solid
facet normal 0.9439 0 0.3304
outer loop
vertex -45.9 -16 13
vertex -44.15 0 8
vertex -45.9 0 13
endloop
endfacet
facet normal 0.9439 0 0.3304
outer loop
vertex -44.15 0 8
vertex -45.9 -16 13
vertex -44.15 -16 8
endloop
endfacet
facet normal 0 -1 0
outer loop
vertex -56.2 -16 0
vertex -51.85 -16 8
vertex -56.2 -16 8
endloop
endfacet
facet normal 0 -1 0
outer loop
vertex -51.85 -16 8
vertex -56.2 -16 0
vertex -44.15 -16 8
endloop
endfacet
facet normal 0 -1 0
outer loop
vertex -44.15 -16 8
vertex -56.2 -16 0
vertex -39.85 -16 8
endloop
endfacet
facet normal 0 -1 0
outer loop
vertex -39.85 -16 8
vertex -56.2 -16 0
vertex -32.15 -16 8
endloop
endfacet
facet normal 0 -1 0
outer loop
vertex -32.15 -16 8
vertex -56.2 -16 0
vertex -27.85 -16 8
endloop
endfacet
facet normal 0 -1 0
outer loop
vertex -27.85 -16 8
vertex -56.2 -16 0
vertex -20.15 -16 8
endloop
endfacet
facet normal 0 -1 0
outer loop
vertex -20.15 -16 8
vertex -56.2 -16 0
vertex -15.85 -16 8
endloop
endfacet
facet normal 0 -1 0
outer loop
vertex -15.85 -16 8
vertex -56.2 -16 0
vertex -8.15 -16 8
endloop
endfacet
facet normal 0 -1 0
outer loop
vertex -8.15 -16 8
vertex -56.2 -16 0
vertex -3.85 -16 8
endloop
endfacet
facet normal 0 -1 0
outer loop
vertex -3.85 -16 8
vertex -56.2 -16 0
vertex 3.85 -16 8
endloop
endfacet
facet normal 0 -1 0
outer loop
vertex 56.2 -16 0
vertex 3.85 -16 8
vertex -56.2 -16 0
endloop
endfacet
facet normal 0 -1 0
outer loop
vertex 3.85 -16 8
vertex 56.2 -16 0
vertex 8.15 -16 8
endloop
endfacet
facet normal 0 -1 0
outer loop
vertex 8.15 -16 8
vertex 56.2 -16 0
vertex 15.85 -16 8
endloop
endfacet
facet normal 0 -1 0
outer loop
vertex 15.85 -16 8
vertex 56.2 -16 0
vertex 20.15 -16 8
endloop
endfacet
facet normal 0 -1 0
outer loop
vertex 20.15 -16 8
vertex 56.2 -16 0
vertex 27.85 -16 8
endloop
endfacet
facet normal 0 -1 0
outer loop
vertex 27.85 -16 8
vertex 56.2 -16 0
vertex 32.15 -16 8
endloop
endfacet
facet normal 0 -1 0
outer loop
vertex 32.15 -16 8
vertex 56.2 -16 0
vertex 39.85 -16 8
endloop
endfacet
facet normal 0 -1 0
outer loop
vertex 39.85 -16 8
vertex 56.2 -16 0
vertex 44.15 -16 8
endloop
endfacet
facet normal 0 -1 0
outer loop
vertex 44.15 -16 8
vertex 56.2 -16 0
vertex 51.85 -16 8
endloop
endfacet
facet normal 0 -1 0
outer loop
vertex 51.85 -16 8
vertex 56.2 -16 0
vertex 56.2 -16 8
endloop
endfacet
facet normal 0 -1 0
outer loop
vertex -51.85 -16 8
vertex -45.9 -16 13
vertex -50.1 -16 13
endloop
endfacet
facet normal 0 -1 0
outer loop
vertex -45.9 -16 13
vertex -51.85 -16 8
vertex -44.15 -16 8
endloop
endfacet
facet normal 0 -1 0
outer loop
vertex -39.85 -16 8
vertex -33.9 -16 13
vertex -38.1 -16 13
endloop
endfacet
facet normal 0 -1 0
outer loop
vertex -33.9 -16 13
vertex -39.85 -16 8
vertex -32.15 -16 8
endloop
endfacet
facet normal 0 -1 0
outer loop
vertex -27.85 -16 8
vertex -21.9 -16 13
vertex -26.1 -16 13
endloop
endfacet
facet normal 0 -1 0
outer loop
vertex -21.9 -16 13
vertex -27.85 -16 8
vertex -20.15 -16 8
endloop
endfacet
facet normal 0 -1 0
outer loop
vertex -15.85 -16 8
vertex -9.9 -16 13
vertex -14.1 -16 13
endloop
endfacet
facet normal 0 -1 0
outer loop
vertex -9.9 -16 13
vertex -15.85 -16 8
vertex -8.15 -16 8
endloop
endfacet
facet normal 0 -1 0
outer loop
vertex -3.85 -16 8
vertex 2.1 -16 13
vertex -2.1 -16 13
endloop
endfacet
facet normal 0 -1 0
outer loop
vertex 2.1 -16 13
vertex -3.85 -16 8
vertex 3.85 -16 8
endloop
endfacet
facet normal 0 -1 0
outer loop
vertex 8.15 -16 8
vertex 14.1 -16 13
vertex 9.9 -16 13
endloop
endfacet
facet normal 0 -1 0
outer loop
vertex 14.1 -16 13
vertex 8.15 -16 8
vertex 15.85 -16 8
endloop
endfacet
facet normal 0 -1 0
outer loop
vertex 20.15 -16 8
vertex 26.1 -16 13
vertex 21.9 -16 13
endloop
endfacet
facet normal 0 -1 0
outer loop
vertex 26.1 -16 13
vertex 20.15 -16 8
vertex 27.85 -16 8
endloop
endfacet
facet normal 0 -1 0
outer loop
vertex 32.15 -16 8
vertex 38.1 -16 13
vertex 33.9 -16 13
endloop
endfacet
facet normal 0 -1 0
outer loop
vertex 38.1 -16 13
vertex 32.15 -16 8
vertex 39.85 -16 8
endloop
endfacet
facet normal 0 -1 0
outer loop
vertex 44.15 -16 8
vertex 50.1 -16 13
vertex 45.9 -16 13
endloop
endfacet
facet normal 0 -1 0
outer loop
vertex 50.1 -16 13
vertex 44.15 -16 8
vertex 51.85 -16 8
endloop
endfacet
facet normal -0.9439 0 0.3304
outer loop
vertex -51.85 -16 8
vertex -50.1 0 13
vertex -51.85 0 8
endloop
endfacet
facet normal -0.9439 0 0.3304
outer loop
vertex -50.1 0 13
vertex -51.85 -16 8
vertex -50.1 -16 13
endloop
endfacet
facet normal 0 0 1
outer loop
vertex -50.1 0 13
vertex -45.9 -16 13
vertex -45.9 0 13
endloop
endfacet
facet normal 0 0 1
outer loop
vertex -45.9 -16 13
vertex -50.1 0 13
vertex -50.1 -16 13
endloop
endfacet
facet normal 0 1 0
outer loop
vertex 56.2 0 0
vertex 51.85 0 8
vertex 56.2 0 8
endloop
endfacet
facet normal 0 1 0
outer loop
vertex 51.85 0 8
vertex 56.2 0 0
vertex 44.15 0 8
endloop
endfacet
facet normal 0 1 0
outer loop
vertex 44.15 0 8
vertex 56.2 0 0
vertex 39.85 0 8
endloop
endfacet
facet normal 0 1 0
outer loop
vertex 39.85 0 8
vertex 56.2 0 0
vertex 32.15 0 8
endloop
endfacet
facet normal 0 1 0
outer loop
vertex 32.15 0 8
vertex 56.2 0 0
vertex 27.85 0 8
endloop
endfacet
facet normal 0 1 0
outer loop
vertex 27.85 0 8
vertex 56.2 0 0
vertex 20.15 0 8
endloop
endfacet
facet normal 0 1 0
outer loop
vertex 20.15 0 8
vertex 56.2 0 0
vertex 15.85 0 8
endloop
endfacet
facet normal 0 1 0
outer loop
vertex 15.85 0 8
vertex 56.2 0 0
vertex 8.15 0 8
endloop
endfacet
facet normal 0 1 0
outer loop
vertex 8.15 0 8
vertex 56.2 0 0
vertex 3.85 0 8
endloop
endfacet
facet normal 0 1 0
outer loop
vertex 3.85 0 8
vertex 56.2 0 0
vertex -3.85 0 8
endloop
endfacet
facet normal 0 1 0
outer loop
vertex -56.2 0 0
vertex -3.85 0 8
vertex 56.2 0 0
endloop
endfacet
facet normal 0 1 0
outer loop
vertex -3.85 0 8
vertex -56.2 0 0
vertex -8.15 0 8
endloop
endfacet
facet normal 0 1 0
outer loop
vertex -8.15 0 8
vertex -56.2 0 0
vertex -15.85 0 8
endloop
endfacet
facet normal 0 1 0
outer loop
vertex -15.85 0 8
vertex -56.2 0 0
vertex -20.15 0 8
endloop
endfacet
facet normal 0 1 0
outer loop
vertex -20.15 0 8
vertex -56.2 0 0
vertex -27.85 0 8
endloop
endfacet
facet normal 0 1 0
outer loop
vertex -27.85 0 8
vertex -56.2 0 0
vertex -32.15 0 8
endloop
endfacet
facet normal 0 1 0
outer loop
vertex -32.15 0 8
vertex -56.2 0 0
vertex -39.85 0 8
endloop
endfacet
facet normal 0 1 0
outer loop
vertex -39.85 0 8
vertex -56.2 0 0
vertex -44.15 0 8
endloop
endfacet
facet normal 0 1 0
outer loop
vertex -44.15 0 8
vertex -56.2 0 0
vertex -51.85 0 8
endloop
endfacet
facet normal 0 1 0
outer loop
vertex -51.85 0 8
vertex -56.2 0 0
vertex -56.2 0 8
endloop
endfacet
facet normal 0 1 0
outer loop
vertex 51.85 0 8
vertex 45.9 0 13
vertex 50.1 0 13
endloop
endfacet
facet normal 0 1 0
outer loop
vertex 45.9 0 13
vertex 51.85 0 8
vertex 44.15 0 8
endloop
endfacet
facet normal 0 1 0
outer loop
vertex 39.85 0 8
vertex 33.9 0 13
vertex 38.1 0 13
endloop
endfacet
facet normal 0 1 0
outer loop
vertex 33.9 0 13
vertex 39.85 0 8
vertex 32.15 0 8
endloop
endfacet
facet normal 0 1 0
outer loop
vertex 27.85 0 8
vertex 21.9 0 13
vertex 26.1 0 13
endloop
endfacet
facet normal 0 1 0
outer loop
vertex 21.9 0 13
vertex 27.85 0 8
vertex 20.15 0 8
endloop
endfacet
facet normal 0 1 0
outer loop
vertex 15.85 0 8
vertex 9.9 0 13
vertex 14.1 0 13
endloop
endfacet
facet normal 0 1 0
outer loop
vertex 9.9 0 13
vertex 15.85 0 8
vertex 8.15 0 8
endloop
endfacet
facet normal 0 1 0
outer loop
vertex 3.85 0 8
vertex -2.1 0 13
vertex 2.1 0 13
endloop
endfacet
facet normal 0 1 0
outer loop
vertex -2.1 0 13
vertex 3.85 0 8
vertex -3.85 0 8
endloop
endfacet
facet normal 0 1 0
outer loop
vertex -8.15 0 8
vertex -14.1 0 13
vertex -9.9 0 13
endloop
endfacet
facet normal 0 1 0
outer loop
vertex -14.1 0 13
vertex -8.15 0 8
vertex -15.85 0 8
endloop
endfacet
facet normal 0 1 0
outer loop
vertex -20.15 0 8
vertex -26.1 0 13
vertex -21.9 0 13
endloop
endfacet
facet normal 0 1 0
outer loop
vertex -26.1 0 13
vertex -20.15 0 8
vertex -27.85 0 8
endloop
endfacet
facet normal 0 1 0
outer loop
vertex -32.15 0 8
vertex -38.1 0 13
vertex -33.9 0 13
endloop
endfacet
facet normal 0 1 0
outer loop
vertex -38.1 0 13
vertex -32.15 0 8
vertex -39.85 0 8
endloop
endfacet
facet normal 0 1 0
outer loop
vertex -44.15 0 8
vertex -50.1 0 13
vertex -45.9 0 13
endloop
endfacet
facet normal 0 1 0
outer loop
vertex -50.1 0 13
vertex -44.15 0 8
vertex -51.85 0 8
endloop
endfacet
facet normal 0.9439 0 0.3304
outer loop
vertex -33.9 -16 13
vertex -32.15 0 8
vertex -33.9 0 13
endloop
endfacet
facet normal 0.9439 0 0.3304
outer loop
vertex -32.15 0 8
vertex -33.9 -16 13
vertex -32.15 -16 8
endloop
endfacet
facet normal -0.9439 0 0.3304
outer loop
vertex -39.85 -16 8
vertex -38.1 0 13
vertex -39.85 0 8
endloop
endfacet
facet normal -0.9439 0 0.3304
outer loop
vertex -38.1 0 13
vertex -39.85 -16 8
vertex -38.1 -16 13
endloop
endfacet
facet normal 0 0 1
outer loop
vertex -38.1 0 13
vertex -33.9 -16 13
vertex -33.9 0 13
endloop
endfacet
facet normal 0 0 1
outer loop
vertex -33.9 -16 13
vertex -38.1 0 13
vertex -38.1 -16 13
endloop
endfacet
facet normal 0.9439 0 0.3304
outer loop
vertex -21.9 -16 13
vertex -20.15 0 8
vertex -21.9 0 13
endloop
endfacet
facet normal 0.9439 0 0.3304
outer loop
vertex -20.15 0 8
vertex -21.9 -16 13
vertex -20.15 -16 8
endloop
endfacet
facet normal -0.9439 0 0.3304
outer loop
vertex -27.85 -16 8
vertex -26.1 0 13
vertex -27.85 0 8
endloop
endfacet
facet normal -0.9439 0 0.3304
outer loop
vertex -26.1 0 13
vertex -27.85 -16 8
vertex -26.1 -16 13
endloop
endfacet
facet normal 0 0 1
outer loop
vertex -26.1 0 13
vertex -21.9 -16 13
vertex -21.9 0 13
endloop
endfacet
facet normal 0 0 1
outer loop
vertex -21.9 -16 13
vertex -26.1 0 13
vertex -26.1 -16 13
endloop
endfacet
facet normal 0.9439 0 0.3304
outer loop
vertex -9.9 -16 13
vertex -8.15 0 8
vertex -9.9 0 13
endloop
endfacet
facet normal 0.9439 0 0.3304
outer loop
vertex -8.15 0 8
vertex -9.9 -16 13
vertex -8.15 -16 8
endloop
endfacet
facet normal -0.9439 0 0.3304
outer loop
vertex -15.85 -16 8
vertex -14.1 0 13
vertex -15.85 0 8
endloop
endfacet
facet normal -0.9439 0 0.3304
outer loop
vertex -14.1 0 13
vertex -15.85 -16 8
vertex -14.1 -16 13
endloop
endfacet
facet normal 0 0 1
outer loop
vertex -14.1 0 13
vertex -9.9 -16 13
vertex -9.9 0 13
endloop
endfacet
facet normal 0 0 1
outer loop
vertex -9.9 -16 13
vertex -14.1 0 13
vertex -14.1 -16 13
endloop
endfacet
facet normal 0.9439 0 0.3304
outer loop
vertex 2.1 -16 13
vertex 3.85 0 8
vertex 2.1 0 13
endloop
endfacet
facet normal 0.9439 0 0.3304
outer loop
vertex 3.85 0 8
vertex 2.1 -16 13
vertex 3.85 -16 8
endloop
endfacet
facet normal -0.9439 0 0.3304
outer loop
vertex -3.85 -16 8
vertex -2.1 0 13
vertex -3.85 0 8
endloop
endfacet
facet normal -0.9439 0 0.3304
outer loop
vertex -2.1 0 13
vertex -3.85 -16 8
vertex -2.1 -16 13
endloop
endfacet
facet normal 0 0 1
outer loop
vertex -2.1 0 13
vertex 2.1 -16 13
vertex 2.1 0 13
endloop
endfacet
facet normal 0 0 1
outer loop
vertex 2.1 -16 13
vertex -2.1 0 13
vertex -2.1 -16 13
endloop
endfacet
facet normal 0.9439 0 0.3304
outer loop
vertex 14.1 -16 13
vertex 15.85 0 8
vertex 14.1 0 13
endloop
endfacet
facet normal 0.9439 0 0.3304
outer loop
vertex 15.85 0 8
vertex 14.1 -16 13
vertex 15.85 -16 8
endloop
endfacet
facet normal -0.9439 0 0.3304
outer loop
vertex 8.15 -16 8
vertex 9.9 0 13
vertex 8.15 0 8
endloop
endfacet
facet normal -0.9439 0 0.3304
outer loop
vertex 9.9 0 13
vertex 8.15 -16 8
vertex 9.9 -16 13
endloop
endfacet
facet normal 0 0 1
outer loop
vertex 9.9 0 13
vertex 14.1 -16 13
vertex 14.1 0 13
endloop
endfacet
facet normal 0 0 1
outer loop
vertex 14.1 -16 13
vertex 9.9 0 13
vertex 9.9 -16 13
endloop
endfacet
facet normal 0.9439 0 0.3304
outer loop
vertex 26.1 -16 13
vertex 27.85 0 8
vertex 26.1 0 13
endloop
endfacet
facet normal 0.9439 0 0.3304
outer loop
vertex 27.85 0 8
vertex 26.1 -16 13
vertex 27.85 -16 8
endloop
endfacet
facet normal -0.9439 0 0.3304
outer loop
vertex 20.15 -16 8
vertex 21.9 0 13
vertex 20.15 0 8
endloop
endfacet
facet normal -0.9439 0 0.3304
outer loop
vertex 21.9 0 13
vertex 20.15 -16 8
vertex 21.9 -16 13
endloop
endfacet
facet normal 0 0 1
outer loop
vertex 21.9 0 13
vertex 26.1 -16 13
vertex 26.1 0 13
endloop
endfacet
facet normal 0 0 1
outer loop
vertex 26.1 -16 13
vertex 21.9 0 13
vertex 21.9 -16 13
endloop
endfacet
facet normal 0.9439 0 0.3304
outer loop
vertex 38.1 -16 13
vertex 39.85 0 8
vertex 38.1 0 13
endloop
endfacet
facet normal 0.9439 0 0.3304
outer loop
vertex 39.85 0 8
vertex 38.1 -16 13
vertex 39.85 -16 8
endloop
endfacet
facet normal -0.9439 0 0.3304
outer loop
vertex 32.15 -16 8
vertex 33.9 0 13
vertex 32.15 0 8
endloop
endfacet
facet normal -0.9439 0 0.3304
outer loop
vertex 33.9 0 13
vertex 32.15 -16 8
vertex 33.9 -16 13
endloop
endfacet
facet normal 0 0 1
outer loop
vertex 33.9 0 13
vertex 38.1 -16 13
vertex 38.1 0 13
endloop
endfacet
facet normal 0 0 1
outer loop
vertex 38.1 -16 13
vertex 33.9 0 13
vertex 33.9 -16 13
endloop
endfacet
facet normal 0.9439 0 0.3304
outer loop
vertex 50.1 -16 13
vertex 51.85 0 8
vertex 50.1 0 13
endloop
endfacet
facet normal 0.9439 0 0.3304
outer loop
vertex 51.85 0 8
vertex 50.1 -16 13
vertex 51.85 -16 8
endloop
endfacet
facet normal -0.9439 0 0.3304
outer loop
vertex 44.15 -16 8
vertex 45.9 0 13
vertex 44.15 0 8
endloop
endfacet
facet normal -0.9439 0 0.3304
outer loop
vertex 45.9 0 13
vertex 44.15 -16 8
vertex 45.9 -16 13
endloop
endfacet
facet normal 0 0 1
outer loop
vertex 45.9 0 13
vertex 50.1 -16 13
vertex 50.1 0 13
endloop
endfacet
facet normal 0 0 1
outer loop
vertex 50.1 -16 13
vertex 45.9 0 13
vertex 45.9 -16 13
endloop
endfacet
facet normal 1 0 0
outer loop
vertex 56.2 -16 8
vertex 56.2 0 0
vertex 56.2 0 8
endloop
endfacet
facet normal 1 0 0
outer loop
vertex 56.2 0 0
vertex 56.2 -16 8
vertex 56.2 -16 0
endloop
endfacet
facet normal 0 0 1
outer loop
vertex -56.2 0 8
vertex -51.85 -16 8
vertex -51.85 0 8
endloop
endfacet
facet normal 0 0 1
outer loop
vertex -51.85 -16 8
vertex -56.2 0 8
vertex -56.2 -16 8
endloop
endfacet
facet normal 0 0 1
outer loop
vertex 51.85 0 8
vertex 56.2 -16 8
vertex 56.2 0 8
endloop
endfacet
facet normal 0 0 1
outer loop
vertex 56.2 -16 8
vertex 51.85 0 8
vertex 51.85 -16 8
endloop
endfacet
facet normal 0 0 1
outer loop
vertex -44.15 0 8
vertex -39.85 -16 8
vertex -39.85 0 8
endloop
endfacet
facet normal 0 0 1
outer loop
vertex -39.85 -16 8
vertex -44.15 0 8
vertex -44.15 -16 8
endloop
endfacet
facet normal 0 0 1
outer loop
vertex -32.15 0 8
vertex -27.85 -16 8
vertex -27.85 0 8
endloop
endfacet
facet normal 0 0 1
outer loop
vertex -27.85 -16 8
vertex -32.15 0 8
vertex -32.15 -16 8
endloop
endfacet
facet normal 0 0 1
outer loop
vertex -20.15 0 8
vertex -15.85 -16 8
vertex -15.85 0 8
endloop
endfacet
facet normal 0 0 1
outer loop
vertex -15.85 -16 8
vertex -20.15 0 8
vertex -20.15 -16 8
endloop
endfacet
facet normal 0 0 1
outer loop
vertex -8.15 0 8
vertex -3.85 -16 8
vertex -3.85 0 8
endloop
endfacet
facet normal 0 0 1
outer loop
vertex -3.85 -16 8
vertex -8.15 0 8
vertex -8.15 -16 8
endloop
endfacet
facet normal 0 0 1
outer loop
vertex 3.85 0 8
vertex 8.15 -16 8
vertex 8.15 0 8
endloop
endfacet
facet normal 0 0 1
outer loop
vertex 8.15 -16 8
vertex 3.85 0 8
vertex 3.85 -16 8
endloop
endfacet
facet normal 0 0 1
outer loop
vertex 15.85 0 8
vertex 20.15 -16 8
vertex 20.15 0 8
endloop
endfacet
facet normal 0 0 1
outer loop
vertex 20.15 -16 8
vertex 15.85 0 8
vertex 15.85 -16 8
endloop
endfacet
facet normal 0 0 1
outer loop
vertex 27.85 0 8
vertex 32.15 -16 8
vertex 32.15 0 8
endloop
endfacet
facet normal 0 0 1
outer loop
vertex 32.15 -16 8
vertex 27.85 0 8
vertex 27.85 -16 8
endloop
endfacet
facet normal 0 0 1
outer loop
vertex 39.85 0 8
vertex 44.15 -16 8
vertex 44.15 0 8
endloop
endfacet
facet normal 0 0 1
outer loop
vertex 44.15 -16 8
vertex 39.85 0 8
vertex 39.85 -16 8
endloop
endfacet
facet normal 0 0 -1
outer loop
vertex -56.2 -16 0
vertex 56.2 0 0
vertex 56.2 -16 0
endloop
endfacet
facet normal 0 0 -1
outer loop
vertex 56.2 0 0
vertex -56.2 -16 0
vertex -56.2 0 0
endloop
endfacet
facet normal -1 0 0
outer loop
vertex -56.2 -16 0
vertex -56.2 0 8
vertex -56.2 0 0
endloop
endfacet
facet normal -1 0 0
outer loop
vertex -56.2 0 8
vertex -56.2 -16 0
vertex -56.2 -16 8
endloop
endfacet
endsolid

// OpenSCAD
$fn = 32;

// ----------------------------------------------------------------------
// Toothed rack, 9 teeth
// 12 mm pitch, 5 mm teeth
// ----------------------------------------------------------------------

// --- parameters (mm) ---
bar_w = 16;     // bar width (Y)
bar_h = 8;      // bar height (Z)
teeth = 9;      // number of teeth
pitch = 12;     // tooth pitch
tooth_h = 5;    // tooth height above the bar
root_w = 8.4;   // tooth width at the root
crest_w = 4.2;  // tooth width at the crest

// --- derived feature positions (mm) ---
span = (teeth - 1) * pitch;  // = 96   distance between the outer teeth
bar_l = span + root_w + 8;   // = 112.4   bar length: teeth plus 4 mm at each end
tooth_x = -span / 2;         // = -48   X of the first tooth
height = bar_h + tooth_h;    // = 13   overall height
feature_centers = [
  [tooth_x + 0 * pitch, -bar_w / 2],
  [tooth_x + 1 * pitch, -bar_w / 2],
  [tooth_x + 2 * pitch, -bar_w / 2],
  [tooth_x + 3 * pitch, -bar_w / 2],
  [tooth_x + 4 * pitch, -bar_w / 2],
  [tooth_x + 5 * pitch, -bar_w / 2],
  [tooth_x + 6 * pitch, -bar_w / 2],
  [tooth_x + 7 * pitch, -bar_w / 2],
  [tooth_x + 8 * pitch, -bar_w / 2]
];   // tooth centre line, drives the tooth loop

// bar with a rack of teeth, one extruded trapezoium per centre
module rack_tooth() {
  linear_extrude(height = bar_w)
    polygon(points = [
      [0, 0],
      [root_w, 0],
      [root_w / 2 + crest_w / 2, tooth_h + 1],
      [root_w / 2 - crest_w / 2, tooth_h + 1]
    ]);
}

union() {
  translate([-bar_l / 2, -bar_w, 0]) cube([bar_l, bar_w, bar_h]);
  for (centre = feature_centers)
    translate([centre[0] - root_w / 2, 0, bar_h - 1]) rotate([90, 0, 0]) rack_tooth();
}
